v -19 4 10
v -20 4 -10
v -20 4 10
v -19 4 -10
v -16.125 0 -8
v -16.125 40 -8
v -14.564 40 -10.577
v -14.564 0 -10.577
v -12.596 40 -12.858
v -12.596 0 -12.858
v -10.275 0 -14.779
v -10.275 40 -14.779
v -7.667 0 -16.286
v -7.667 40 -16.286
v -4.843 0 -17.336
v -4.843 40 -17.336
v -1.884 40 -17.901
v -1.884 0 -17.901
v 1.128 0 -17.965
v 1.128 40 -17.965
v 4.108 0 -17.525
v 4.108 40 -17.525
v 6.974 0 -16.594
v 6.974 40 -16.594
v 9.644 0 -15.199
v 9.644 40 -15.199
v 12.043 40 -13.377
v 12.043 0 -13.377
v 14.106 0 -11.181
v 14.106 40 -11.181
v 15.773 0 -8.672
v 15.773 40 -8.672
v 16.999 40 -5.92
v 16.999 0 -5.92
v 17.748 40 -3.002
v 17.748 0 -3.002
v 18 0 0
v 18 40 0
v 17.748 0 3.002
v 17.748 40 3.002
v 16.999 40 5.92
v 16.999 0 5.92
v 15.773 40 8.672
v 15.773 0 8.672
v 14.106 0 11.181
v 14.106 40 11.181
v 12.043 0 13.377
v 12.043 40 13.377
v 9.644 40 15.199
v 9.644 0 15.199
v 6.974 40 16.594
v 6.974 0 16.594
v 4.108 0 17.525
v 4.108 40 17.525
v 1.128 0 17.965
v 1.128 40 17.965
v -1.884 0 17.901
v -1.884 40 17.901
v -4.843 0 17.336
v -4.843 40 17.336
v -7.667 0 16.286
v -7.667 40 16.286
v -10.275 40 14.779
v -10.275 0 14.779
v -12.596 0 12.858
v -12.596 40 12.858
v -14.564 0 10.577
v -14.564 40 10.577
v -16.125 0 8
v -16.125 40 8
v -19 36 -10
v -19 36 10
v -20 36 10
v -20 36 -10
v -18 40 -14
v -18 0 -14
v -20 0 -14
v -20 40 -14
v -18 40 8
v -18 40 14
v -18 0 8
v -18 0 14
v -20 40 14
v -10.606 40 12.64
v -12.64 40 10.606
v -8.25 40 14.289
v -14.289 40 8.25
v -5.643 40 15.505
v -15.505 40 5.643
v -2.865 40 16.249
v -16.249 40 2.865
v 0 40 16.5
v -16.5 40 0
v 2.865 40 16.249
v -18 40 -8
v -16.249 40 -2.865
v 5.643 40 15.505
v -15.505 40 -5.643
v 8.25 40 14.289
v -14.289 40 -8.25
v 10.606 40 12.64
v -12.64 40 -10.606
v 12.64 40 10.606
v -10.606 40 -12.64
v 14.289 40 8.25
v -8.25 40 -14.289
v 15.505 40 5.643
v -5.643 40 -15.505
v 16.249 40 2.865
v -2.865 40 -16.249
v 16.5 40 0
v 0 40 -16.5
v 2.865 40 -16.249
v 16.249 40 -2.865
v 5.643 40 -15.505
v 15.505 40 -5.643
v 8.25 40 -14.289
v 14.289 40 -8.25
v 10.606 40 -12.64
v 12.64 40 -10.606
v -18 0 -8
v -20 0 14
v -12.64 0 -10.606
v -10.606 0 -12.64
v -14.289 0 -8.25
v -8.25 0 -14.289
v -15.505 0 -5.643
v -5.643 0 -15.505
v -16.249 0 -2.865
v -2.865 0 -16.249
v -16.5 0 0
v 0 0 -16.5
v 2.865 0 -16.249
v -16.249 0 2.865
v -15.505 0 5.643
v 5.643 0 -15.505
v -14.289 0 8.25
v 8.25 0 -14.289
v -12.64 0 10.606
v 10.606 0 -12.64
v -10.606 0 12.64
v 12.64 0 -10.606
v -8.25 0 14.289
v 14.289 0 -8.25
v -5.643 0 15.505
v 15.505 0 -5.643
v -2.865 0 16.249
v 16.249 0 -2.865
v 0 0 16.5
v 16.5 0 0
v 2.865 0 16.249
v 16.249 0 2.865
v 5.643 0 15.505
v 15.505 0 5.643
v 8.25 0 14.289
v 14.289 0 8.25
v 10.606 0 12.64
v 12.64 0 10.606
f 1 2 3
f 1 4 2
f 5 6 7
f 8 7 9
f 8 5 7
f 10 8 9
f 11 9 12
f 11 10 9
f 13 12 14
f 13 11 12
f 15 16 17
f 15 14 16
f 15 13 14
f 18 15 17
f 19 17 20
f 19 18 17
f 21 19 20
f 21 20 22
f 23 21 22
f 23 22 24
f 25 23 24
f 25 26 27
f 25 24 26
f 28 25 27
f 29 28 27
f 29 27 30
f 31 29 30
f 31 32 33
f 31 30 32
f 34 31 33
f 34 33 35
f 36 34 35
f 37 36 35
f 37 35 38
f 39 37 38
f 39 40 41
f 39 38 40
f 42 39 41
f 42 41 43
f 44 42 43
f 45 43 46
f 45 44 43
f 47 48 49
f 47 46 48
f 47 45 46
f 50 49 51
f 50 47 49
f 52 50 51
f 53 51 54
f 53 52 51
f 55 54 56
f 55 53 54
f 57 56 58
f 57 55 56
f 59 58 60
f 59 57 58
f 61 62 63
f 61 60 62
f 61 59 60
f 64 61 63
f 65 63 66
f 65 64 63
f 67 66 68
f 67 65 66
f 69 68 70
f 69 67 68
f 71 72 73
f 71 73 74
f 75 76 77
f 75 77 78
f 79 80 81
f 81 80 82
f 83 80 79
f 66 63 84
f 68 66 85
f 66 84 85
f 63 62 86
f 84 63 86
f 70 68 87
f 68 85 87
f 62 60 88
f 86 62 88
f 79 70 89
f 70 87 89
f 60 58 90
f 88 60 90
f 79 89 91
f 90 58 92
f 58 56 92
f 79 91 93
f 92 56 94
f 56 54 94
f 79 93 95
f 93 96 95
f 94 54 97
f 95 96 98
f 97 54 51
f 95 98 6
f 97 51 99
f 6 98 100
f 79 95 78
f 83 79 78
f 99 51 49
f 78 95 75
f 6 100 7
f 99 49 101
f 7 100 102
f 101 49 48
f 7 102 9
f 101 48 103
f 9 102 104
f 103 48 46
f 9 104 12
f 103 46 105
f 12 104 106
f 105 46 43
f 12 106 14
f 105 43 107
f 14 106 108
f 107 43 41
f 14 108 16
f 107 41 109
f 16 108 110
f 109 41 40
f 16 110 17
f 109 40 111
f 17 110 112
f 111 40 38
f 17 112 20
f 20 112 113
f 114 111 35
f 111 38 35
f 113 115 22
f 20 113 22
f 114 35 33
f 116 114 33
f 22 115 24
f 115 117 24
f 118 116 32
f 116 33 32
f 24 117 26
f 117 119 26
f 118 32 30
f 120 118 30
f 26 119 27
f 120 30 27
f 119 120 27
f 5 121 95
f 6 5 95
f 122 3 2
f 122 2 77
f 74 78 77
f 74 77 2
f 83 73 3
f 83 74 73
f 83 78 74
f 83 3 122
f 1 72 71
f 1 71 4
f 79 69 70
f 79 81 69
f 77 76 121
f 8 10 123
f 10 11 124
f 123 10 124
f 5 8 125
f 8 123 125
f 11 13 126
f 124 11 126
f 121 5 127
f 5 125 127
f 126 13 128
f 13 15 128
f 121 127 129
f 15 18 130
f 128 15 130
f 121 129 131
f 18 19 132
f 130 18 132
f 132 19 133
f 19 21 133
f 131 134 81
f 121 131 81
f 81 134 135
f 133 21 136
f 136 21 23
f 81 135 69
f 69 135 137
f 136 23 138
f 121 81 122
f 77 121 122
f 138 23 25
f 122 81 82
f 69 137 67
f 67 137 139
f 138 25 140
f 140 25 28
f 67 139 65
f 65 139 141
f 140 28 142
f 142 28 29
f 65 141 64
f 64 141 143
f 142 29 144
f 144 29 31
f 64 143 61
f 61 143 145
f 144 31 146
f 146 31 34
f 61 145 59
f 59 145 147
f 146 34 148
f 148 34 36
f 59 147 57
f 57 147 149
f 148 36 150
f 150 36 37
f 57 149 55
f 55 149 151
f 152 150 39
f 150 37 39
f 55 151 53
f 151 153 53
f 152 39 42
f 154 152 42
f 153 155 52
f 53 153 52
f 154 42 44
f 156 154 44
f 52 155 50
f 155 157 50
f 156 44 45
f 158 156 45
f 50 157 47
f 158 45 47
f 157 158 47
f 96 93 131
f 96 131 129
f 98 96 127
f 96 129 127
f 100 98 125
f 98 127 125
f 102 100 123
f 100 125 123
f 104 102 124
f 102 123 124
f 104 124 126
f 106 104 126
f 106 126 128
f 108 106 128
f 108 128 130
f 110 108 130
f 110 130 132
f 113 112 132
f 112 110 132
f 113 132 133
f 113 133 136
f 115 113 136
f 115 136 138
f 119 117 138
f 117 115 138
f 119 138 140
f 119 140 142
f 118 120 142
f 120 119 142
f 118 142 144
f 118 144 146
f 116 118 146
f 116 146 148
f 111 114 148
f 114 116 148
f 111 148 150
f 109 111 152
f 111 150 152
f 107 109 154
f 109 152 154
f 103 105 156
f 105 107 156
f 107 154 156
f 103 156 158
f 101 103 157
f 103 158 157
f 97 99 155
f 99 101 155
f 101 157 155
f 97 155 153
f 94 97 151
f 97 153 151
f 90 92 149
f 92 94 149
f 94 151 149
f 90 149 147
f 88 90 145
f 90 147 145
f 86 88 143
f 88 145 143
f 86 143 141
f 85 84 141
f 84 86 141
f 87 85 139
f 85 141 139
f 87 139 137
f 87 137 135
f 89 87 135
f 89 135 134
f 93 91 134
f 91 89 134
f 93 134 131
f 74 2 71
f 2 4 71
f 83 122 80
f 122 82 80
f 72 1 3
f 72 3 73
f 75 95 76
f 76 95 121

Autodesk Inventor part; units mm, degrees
ref_plane "YZ Plane" through (0, 0, 0) normal (1, 0, 0) x (0, 1, 0)
ref_plane "XZ Plane" through (0, 0, 0) normal (0, 1, 0) x (-1, 0, 0)
sketch "Sketch1" plane through (0, 0, 0) normal (0, 1, 0) x (-1, 0, 0)
  circle A0 centre (0, 0) radius 16.5
  circle A1 centre (0, 0) radius 18
  dimension "d0" = 33
  dimension "d1" = 36
extrude "Extrusion1" add sketch "Sketch1" along normal blind 40
sketch "Sketch2" plane through (0, 40, 0) normal (0, 1, 0) x (1, 0, 0)
  circle A0 centre (0, 0) radius 18 construction
  circle A1 centre (0, 0) radius 16.5 construction
  line L0 (0, 0) -> (-18, 0) construction
ref_plane "Work Plane1" through (-18, 40, 0) normal (-1, 0, 0) x (0, -1, 0)
sketch "Sketch3" plane through (-18, 40, 0) normal (-1, 0, 0) x (0, -1, 0)
  line L0 (0, 18) -> (0, -18) construction
  line L1 (40, 18) -> (40, -18) construction
  line L2 (0, 0) -> (40, 0)
  line L3 (40, 0) -> (40, -8)
  line L4 (40, -8) -> (0, -8)
  line L5 (0, -8) -> (0, 0)
  line L6 (40, 0) -> (40, 8)
  line L7 (40, 8) -> (0, 8)
  line L8 (0, 8) -> (0, 0)
  line L9 (0, -8) -> (40, -8)
  line L10 (40, -8) -> (40, -14)
  line L11 (40, -14) -> (0, -14)
  line L12 (0, -14) -> (0, -8)
  line L13 (0, 8) -> (40, 8)
  line L14 (40, 8) -> (40, 14)
  line L15 (40, 14) -> (0, 14)
  line L16 (0, 14) -> (0, 8)
  dimension "d4" = 8
  dimension "d5" = 6
  dimension "d6" = 6
extrude "Extrusion2" add sketch "Sketch3" against normal up to surface contours L8 L7 L6 L2 | L2 L3 L4 L5
extrude "Extrusion3" add sketch "Sketch3" along normal blind 1
sketch "Sketch4" plane through (-19, 40, 0) normal (-1, 0, 0) x (0, 0, 1)
  line L0 (14, 0) -> (-14, 0) construction
  line L1 (-14, -40) -> (-10, -40)
  line L2 (-10, -40) -> (-10, 0)
  line L3 (-10, 0) -> (-14, 0)
  line L4 (-14, 0) -> (-14, -40)
  line L5 (-10, 0) -> (10.2529, 0)
  line L6 (10.2529, 0) -> (10.2529, -4)
  line L7 (10.2529, -4) -> (-10, -4)
  line L8 (-10, -4) -> (-10, 0)
  line L9 (14, -40) -> (10, -40)
  line L10 (10, -40) -> (10, 0)
  line L11 (10, 0) -> (14, 0)
  line L12 (14, 0) -> (14, -40)
  line L13 (10, -40) -> (-10, -40)
  line L14 (-10, -40) -> (-10, -36)
  line L15 (-10, -36) -> (10, -36)
  line L16 (10, -36) -> (10, -40)
  point P0 (0, -40)
  point P1 (10, -4)
  point P2 (-10, -4)
  dimension "d11" = 4
  dimension "d12" = 4
  dimension "d13" = 4
  dimension "d14" = 4
extrude "Extrusion4" add sketch "Sketch4" along normal blind 1 contours L4 L3 L2 L1 | L2 L15 L10 L13 | L10 L7 L6 L11 L12 L9 | L5 L10 L7 L2 | L5 L6 L7 L10
